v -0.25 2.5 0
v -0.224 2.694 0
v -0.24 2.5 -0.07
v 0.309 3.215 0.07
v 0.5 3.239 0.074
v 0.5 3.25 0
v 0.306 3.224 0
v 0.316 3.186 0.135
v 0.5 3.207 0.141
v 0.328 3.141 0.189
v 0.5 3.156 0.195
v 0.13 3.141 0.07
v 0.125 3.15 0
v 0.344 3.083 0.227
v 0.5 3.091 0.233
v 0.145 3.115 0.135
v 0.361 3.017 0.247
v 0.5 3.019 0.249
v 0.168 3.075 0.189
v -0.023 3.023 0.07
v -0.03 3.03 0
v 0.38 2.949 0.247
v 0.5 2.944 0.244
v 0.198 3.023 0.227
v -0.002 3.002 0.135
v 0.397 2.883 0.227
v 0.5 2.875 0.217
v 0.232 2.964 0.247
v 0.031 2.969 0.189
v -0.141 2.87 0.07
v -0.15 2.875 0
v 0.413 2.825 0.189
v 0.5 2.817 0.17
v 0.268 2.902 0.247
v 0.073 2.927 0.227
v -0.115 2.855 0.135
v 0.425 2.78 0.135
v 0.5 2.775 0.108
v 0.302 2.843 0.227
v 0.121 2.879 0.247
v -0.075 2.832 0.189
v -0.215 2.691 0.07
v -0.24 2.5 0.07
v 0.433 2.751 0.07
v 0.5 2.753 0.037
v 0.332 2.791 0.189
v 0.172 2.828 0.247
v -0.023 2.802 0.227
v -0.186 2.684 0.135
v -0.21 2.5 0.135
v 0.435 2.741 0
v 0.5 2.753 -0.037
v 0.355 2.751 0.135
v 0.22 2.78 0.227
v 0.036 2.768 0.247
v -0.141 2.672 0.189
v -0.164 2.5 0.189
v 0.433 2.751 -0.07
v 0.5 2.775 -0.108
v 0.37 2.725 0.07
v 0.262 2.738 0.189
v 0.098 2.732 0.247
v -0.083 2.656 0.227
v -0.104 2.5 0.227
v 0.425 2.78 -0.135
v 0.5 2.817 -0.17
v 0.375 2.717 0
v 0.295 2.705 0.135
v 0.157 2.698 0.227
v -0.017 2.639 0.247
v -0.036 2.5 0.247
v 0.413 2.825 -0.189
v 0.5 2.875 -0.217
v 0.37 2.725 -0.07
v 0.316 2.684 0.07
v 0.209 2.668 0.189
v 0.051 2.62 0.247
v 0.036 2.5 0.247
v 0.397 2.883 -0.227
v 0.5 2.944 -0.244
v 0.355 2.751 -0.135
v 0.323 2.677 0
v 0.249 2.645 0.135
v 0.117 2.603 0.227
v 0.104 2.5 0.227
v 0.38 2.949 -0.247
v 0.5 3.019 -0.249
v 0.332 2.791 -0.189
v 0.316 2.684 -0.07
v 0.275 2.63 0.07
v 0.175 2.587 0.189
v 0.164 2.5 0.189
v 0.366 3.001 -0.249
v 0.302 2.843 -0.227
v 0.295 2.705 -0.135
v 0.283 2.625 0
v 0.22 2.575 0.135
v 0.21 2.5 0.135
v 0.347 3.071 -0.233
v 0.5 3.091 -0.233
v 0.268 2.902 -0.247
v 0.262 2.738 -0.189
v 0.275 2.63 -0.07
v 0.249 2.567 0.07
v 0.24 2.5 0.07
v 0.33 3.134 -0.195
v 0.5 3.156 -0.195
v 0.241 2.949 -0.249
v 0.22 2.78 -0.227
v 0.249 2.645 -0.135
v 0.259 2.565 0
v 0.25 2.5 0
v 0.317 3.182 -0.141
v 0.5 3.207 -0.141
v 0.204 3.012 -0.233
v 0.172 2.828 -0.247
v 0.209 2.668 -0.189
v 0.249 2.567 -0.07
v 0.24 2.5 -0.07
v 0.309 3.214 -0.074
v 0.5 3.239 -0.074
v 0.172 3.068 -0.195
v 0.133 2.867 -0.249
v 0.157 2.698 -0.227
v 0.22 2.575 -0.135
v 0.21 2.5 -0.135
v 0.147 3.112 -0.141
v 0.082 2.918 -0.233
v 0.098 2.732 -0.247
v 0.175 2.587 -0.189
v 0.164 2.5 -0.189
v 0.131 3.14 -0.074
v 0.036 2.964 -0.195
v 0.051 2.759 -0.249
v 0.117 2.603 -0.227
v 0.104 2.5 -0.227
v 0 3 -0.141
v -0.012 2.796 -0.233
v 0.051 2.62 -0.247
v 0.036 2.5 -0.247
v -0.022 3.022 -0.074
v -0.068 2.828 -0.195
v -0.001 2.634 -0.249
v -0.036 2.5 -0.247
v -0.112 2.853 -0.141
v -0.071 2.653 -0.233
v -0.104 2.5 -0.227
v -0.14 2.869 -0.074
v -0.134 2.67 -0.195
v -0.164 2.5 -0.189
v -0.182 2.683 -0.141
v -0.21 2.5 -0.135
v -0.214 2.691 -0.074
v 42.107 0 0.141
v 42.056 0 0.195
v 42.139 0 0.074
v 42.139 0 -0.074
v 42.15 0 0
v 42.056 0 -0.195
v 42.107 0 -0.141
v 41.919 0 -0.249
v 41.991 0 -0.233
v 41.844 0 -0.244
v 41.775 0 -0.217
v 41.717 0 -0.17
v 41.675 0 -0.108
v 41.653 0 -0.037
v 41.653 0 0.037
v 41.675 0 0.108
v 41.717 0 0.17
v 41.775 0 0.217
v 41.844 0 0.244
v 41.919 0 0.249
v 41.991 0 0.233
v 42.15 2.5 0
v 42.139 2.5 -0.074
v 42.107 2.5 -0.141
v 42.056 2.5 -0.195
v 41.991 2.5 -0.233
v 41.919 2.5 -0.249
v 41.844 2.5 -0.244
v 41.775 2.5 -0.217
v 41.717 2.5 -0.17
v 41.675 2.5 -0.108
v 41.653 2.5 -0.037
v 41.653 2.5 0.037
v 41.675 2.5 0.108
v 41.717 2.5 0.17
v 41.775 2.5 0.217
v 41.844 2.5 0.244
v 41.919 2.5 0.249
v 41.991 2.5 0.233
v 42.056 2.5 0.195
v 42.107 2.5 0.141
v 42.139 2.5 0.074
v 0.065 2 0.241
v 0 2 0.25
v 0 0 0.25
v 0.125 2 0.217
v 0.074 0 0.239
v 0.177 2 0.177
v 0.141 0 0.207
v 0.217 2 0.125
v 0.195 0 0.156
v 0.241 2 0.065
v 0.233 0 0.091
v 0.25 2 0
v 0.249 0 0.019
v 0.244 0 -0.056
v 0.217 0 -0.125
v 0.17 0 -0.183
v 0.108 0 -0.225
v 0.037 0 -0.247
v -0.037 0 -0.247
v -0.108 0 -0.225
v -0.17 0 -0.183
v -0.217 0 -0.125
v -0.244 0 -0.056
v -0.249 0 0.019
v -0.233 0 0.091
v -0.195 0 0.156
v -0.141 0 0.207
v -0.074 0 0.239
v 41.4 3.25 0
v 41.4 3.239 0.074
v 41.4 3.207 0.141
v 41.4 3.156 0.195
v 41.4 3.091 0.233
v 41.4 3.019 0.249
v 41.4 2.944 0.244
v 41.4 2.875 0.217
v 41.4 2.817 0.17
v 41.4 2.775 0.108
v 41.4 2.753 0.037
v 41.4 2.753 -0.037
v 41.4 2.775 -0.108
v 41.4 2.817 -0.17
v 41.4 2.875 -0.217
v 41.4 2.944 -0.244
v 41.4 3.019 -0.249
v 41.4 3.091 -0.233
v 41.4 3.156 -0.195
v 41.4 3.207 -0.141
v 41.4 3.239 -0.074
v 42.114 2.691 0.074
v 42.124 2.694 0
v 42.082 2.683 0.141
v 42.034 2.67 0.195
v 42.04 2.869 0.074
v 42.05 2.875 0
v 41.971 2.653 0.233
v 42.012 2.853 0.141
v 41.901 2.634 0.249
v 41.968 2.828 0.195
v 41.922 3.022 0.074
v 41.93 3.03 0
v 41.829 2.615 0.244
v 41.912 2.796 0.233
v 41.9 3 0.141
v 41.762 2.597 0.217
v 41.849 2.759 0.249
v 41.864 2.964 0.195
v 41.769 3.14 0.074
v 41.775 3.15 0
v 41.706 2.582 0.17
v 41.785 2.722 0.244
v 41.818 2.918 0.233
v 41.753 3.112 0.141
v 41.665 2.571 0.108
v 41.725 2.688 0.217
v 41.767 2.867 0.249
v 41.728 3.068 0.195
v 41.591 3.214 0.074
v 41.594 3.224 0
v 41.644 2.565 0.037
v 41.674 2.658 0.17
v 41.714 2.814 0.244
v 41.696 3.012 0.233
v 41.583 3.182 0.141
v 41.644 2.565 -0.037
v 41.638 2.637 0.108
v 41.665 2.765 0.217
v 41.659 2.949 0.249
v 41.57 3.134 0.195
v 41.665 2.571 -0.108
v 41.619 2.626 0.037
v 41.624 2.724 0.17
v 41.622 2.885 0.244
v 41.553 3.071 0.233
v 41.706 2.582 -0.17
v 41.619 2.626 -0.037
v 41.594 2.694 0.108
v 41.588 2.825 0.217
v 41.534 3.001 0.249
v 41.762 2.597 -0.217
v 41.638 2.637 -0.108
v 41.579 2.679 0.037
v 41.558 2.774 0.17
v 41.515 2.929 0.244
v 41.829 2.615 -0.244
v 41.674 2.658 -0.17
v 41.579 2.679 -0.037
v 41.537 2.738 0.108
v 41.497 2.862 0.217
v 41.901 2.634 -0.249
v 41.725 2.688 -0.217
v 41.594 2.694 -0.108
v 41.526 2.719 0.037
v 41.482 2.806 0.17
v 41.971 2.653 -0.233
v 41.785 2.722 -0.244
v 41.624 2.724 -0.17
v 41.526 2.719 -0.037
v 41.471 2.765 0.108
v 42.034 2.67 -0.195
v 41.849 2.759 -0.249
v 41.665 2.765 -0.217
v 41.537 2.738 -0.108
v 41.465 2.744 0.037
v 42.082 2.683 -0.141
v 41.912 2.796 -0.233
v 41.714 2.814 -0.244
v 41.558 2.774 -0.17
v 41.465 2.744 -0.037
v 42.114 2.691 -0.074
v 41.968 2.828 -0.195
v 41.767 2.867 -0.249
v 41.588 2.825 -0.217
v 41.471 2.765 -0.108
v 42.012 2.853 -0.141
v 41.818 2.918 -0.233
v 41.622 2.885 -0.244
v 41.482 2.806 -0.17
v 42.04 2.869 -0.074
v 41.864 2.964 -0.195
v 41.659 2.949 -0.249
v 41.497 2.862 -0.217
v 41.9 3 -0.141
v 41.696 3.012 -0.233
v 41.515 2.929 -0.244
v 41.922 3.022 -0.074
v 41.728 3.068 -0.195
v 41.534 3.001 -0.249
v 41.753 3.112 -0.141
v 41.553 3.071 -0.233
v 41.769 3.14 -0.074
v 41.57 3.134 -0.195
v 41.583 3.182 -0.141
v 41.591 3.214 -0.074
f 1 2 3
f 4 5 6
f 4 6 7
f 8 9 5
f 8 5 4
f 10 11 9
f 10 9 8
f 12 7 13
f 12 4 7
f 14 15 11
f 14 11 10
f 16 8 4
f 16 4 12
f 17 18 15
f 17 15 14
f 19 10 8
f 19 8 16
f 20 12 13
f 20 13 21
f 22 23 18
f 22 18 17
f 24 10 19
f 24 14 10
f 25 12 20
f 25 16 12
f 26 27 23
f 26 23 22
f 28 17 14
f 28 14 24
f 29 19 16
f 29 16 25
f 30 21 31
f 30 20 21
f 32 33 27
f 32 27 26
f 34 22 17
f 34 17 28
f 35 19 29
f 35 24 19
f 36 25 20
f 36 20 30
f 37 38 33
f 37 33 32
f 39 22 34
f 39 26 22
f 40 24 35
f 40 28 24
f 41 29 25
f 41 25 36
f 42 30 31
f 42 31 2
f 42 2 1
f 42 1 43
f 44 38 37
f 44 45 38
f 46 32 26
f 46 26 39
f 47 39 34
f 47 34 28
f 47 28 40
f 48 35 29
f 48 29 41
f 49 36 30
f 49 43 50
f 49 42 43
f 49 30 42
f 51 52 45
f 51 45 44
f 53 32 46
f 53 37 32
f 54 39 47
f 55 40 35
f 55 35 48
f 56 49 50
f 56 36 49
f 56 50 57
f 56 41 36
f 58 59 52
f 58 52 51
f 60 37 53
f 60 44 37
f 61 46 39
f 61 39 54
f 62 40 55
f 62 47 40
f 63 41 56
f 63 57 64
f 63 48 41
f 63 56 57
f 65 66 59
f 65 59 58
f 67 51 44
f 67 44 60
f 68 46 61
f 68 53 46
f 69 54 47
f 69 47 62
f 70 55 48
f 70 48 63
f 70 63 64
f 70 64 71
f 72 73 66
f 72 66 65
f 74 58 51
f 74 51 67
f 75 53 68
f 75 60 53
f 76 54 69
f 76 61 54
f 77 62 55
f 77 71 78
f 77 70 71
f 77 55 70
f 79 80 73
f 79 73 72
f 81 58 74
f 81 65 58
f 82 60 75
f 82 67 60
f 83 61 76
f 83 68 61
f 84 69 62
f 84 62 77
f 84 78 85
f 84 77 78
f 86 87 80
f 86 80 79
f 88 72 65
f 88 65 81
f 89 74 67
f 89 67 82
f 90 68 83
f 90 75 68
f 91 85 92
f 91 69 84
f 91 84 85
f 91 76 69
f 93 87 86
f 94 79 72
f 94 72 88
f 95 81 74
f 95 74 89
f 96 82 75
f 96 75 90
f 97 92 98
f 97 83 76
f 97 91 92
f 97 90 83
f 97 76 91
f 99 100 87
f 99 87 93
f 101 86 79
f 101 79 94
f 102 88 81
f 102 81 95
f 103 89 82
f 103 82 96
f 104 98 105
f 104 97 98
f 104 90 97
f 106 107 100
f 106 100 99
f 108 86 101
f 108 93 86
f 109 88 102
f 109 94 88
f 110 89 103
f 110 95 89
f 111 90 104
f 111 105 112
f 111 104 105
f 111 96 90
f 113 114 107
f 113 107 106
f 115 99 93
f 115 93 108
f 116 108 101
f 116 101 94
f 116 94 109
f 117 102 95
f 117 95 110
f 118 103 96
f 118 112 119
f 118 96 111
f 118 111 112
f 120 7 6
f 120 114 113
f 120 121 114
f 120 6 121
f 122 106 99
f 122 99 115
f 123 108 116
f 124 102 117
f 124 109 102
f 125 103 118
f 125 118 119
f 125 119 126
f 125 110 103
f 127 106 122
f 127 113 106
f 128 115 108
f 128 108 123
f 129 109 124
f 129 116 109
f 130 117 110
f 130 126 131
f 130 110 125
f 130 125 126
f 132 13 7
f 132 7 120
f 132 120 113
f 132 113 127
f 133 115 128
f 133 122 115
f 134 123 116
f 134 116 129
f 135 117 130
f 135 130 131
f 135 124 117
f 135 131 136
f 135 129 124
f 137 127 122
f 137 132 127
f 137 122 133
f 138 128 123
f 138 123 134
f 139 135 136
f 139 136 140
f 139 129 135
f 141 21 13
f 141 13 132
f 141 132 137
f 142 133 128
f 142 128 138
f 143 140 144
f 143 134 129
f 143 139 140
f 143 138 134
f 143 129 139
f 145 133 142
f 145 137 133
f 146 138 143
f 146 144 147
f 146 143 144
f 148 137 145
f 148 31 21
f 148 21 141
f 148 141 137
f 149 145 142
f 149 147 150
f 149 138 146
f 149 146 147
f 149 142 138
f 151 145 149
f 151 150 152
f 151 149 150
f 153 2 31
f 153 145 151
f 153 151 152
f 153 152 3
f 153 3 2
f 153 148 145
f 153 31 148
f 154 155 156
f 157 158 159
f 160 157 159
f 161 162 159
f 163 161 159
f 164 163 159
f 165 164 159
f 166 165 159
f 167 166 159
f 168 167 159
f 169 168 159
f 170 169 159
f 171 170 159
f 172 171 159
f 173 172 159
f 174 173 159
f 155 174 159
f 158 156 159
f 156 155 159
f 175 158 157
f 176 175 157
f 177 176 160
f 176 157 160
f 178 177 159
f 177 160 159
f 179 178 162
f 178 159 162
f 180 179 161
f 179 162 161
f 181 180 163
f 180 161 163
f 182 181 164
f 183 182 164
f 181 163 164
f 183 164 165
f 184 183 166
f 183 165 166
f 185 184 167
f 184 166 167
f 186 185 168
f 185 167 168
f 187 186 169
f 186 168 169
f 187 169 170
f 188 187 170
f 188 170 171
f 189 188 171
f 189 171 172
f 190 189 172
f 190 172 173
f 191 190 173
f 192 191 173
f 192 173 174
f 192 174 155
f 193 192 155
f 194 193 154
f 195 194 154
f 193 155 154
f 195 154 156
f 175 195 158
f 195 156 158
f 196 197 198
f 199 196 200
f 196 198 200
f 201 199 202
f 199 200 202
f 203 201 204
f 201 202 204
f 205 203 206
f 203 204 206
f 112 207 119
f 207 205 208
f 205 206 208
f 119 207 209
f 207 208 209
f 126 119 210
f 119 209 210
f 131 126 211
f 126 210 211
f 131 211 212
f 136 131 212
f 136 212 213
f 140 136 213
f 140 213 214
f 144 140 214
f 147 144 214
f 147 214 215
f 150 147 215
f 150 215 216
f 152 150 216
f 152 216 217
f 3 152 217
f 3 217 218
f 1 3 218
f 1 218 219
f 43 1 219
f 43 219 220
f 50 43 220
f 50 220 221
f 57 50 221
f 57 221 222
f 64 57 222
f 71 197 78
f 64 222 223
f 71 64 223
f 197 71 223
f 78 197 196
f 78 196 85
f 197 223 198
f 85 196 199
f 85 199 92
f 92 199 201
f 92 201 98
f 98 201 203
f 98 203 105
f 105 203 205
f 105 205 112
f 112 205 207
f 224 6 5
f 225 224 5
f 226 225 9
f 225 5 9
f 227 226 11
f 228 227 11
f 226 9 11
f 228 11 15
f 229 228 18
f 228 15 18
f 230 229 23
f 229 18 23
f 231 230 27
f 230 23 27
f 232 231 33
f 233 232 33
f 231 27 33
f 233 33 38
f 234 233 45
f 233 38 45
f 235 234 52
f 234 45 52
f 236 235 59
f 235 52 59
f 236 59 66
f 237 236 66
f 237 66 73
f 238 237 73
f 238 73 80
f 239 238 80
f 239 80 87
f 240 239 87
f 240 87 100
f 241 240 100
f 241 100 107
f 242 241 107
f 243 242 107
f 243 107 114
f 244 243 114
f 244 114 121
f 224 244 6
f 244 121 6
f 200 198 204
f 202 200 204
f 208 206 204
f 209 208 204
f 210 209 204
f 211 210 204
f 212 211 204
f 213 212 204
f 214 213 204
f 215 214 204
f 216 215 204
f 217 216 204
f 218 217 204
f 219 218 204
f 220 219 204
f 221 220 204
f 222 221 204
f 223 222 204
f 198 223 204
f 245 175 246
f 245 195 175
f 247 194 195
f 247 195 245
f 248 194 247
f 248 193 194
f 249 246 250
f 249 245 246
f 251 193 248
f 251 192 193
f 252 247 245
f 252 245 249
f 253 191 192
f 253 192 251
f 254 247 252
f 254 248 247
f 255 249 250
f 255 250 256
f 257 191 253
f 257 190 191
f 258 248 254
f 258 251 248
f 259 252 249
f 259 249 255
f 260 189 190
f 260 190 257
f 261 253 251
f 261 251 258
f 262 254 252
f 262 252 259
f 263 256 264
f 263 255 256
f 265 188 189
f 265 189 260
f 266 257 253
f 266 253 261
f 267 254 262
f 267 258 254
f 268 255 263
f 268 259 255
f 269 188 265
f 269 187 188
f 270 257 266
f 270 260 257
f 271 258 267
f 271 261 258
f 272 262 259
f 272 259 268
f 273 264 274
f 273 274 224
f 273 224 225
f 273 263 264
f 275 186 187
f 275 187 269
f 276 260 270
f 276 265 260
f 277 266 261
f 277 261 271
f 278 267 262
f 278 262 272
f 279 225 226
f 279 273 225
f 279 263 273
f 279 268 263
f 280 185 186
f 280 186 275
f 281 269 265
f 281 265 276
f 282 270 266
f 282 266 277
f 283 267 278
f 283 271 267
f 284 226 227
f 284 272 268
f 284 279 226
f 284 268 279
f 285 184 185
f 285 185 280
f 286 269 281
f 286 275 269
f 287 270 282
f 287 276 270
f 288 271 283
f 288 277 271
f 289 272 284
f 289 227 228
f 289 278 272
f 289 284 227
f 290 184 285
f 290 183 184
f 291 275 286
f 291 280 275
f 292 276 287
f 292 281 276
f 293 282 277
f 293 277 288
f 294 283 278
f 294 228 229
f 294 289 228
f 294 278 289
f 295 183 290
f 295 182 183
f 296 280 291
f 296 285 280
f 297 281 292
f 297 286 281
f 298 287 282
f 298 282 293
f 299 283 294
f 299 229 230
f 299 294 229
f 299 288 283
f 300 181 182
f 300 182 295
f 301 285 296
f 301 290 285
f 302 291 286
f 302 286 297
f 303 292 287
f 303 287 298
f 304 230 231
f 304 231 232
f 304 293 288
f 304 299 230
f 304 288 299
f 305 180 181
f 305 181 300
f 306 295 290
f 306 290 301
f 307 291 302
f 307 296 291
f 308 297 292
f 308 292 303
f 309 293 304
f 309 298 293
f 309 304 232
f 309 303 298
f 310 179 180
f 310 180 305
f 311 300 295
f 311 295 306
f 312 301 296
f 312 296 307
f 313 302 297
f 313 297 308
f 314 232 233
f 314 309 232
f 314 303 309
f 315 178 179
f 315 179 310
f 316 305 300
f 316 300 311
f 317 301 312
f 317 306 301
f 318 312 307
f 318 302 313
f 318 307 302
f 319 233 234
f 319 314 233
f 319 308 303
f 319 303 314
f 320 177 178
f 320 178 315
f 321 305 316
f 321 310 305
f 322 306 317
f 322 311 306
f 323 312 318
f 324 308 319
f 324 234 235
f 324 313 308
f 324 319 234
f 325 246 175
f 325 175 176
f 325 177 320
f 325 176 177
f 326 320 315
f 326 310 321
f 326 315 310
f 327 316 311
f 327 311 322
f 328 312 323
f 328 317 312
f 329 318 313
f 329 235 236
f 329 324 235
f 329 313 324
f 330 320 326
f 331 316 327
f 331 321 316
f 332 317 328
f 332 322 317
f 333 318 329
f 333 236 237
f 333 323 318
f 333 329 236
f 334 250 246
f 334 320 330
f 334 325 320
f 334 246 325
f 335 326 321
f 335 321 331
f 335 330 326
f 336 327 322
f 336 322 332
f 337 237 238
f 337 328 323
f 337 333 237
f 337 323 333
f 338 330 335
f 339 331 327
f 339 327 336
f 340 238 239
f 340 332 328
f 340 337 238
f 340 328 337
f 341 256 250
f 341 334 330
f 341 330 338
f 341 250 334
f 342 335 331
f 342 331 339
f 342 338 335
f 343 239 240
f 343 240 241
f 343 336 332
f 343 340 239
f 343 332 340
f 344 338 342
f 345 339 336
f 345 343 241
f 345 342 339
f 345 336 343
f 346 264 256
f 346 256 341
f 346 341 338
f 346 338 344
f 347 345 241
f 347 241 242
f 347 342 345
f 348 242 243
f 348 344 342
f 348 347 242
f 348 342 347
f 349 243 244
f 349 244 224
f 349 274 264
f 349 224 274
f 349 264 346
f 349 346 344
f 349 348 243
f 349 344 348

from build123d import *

# Parameters (mm, degrees)
SKETCH1_R           = 0.25
BOSS_EXTRUDE1_DEPTH = 2
SWEEP1_OUTLINE_R    = 0.25
SWEEP1_DEPTH        = 2.5
SWEEP1_2_OUTLINE_R  = 0.25
SWEEP1_2_ANGLE      = 90
SWEEP1_3_OUTLINE_R  = 0.25
SWEEP1_3_ANGLE      = 90
SWEEP1_START        = 0.4999999
SWEEP1_4_OUTLINE_R  = 0.25
SWEEP1_4_DEPTH      = 40.9000002


with BuildPart() as part:
    # Sketch1 → Boss-Extrude1 (new body)
    with BuildSketch(Plane(origin=(0, 0, 0), x_dir=(1, 0, 0), z_dir=(0, 1, 0))):
        with Locations(Location((0, 0, 0), (0, 0, 270))):
            Circle(SKETCH1_R)
    extrude(amount=BOSS_EXTRUDE1_DEPTH)

    # Sweep1: read off the stored shape, not the designer's step
    # Sweep1 outline → Sweep1 (add)
    with BuildSketch(Plane(origin=(0, 0, 0), x_dir=(1, 0, 0), z_dir=(0, 1, 0))):
        Circle(SWEEP1_OUTLINE_R)
        with Locations((41.9, 0)):
            Circle(SWEEP1_OUTLINE_R)
    extrude(amount=SWEEP1_DEPTH)

    # Sweep1 2 outline → Sweep1 2 (revolve)
    with BuildSketch(Plane(origin=(0.5, 2.5, 0), x_dir=(0, 1, 0), z_dir=(1, 0, 0))):
        with Locations((0.5, 0)):
            Circle(SWEEP1_2_OUTLINE_R)
    revolve(axis=Axis((0.5, 2.5, 0), (0, 0, 1)), revolution_arc=SWEEP1_2_ANGLE)

    # Sweep1 3 outline → Sweep1 3 (revolve)
    with BuildSketch(Plane(origin=(41.4, 2.5, 0), x_dir=(1, 0, 0), z_dir=(0, -1, 0))):
        with Locations((0.5, 0)):
            Circle(SWEEP1_3_OUTLINE_R)
    revolve(axis=Axis((41.4, 2.5, 0), (0, 0, 1)), revolution_arc=SWEEP1_3_ANGLE)

    # Sweep1 4 outline → Sweep1 4 (add)
    with BuildSketch(Plane.YZ.offset(SWEEP1_START)):
        with Locations((3, 0)):
            Circle(SWEEP1_4_OUTLINE_R)
    extrude(amount=SWEEP1_4_DEPTH)


solid = part.part
